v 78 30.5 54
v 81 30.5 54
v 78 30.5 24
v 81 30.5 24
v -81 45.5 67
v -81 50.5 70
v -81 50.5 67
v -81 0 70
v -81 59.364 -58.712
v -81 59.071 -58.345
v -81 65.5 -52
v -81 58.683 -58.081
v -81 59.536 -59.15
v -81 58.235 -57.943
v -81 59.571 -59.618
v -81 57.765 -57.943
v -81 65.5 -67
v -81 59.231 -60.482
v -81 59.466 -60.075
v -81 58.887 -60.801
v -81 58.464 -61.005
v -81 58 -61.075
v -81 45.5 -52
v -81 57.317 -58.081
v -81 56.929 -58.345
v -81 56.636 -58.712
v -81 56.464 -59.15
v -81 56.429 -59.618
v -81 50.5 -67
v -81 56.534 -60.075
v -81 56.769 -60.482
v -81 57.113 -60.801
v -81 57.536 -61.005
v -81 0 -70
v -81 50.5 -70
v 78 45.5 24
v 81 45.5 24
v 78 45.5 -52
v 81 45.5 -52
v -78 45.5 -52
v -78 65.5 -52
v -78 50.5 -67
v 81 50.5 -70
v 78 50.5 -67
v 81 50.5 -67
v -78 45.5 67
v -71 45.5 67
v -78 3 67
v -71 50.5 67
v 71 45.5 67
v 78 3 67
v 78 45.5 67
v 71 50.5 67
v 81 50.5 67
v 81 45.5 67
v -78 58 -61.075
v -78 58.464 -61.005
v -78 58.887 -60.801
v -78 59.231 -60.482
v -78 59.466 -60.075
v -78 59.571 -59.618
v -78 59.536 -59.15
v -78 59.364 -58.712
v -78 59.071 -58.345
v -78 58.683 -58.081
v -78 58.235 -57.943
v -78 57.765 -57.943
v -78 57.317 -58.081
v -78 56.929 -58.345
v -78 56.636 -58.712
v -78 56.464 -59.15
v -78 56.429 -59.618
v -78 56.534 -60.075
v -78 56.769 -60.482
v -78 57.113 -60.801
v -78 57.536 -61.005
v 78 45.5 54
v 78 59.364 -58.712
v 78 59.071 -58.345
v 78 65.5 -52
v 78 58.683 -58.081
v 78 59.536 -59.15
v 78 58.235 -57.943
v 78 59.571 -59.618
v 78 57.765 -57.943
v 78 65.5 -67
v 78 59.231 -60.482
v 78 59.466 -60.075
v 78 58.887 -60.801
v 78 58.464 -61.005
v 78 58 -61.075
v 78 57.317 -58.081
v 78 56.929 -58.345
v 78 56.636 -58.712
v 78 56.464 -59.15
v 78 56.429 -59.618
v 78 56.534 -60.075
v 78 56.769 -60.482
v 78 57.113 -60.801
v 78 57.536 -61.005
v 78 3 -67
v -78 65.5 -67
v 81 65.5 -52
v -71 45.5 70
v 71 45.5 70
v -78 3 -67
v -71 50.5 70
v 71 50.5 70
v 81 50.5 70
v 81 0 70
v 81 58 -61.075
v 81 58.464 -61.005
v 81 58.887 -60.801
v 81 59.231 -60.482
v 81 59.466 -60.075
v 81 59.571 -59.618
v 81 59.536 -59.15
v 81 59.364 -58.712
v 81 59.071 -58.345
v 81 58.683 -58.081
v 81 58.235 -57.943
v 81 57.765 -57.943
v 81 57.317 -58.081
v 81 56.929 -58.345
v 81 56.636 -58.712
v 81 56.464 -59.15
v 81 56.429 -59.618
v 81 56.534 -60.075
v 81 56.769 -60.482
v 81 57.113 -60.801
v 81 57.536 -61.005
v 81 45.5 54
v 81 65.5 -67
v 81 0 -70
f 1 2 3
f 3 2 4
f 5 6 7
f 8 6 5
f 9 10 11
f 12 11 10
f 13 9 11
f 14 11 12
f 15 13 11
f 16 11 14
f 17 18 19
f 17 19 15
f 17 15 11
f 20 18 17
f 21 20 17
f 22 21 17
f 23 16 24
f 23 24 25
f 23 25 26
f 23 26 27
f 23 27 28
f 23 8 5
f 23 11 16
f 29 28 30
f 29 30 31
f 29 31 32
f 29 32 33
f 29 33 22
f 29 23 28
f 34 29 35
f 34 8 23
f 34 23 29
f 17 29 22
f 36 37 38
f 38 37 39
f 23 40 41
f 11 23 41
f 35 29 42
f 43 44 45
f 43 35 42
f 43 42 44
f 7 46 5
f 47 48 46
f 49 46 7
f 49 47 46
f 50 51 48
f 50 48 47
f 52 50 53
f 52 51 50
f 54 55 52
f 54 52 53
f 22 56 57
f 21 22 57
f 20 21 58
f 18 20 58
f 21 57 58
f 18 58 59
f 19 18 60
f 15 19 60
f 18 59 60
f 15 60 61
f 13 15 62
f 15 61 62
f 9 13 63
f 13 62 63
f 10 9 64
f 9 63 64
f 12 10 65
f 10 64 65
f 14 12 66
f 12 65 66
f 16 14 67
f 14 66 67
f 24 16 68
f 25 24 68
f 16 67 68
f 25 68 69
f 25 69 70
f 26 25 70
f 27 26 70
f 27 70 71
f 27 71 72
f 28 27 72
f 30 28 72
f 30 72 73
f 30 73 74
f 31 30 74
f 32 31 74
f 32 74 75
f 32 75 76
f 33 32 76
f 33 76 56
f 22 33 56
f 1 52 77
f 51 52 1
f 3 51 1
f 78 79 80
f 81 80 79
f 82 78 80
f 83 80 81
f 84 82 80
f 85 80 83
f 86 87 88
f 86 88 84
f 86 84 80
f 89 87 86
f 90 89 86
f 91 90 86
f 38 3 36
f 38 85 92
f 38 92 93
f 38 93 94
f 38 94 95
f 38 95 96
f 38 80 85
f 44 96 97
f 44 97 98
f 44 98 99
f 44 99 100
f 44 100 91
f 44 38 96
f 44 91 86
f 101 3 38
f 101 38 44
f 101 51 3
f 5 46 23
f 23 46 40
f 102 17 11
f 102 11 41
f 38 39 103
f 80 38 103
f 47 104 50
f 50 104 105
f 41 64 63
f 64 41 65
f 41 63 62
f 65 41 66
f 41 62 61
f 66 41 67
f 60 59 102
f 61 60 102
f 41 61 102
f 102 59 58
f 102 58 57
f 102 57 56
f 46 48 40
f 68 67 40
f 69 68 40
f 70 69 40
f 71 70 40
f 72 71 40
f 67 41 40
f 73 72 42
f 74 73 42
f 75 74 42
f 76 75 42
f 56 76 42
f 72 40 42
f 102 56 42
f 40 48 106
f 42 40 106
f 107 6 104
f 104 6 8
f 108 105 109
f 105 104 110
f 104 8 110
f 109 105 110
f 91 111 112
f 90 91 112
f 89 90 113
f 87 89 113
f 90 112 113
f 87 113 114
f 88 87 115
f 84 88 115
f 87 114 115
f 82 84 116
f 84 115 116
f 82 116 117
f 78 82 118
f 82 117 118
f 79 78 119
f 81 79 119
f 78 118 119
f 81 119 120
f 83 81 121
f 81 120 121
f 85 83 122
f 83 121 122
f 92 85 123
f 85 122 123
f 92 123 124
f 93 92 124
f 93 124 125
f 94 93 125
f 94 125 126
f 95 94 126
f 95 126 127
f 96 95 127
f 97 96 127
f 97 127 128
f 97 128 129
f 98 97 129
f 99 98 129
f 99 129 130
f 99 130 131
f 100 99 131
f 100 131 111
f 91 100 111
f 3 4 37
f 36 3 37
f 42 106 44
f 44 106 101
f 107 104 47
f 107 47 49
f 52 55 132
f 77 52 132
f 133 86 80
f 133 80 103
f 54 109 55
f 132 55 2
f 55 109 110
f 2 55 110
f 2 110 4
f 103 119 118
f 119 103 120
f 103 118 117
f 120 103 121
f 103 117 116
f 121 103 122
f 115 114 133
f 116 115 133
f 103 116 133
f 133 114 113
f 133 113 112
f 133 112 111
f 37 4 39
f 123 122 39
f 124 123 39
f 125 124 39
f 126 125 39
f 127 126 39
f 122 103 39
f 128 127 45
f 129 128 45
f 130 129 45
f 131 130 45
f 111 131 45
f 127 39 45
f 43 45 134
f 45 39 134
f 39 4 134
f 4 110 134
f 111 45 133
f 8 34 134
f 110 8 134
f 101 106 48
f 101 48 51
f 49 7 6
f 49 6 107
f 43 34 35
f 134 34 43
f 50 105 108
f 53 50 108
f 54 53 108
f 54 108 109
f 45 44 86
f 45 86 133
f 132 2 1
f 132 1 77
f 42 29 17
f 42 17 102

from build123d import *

# Parameters (mm, degrees)
SKETCH1_W           = 162
SKETCH1_H           = 140
BOSS_EXTRUDE2_DEPTH = 3
SKETCH2_W           = 162
SKETCH2_H           = 140
SKETCH2_W_2         = 156
SKETCH2_H_2         = 134
BOSS_EXTRUDE3_DEPTH = 47.5
SKETCH4_W           = 3
SKETCH4_H           = 134
BOSS_EXTRUDE4_DEPTH = 15
SKETCH5_R           = 1.575
SKETCH5_W           = 119
SKETCH5_H           = 20
CUT_EXTRUDE3_DEPTH  = 189.239873566
CUT_EXTRUDE4_REACH  = 176.503
SKETCH9_W           = 142
SKETCH9_H           = 5
CUT_EXTRUDE5_REACH  = 190.24
SKETCH10_W          = 30
SKETCH10_H          = 15


with BuildPart() as part:
    # Sketch1 → Boss-Extrude2 (new body)
    with BuildSketch(Plane(origin=(0, 0, 0), x_dir=(1, 0, 0), z_dir=(0, 1, 0))):
        Rectangle(SKETCH1_W, SKETCH1_H)
    extrude(amount=BOSS_EXTRUDE2_DEPTH)

    # Sketch2 → Boss-Extrude3 (add)
    with BuildSketch(Plane(origin=(0, 3, 0), x_dir=(1, 0, 0), z_dir=(0, 1, 0))):
        Rectangle(SKETCH2_W, SKETCH2_H)
        Rectangle(SKETCH2_W_2, SKETCH2_H_2, mode=Mode.SUBTRACT)
    extrude(amount=BOSS_EXTRUDE3_DEPTH)

    # Sketch4 → Boss-Extrude4 (add)
    with BuildSketch(Plane(origin=(0, 50.5, 0), x_dir=(1, 0, 0), z_dir=(0, 1, 0))):
        with Locations((-79.5, 0)):
            Rectangle(SKETCH4_W, SKETCH4_H)
        with Locations((79.5, 0)):
            Rectangle(SKETCH4_W, SKETCH4_H)
    extrude(amount=BOSS_EXTRUDE4_DEPTH)

    # Sketch5 → Cut-Extrude3 (cut, through all)
    with BuildSketch(Plane(origin=(81, 0, 0), x_dir=(0, 0, -1), z_dir=(1, 0, 0))):
        with Locations((59.5, 58)):
            Circle(SKETCH5_R)
        with Locations((-7.5, 55.5)):
            Rectangle(SKETCH5_W, SKETCH5_H)
    extrude(amount=-CUT_EXTRUDE3_DEPTH, mode=Mode.SUBTRACT)

    # Sketch9 → Cut-Extrude4 (cut, up to next)
    with BuildSketch(Plane.XY.offset(70), mode=Mode.PRIVATE) as cut_extrude4_sk1:
        with Locations((0, 48)):
            Rectangle(SKETCH9_W, SKETCH9_H)
    cut_extrude4_tool1 = extrude(cut_extrude4_sk1.sketch, amount=-CUT_EXTRUDE4_REACH, mode=Mode.PRIVATE) & part.part
    add(cut_extrude4_tool1.solids().sort_by_distance((0, 48, 70))[0], mode=Mode.SUBTRACT)

    # Sketch10 → Cut-Extrude5 (cut, up to next)
    with BuildSketch(Plane(origin=(81, 0, 0), x_dir=(0, 0, -1), z_dir=(1, 0, 0)), mode=Mode.PRIVATE) as cut_extrude5_sk1:
        with Locations((-39, 38)):
            Rectangle(SKETCH10_W, SKETCH10_H)
    cut_extrude5_tool1 = extrude(cut_extrude5_sk1.sketch, amount=-CUT_EXTRUDE5_REACH, mode=Mode.PRIVATE) & part.part
    add(cut_extrude5_tool1.solids().sort_by_distance((81, 38, 39))[0], mode=Mode.SUBTRACT)


solid = part.part
